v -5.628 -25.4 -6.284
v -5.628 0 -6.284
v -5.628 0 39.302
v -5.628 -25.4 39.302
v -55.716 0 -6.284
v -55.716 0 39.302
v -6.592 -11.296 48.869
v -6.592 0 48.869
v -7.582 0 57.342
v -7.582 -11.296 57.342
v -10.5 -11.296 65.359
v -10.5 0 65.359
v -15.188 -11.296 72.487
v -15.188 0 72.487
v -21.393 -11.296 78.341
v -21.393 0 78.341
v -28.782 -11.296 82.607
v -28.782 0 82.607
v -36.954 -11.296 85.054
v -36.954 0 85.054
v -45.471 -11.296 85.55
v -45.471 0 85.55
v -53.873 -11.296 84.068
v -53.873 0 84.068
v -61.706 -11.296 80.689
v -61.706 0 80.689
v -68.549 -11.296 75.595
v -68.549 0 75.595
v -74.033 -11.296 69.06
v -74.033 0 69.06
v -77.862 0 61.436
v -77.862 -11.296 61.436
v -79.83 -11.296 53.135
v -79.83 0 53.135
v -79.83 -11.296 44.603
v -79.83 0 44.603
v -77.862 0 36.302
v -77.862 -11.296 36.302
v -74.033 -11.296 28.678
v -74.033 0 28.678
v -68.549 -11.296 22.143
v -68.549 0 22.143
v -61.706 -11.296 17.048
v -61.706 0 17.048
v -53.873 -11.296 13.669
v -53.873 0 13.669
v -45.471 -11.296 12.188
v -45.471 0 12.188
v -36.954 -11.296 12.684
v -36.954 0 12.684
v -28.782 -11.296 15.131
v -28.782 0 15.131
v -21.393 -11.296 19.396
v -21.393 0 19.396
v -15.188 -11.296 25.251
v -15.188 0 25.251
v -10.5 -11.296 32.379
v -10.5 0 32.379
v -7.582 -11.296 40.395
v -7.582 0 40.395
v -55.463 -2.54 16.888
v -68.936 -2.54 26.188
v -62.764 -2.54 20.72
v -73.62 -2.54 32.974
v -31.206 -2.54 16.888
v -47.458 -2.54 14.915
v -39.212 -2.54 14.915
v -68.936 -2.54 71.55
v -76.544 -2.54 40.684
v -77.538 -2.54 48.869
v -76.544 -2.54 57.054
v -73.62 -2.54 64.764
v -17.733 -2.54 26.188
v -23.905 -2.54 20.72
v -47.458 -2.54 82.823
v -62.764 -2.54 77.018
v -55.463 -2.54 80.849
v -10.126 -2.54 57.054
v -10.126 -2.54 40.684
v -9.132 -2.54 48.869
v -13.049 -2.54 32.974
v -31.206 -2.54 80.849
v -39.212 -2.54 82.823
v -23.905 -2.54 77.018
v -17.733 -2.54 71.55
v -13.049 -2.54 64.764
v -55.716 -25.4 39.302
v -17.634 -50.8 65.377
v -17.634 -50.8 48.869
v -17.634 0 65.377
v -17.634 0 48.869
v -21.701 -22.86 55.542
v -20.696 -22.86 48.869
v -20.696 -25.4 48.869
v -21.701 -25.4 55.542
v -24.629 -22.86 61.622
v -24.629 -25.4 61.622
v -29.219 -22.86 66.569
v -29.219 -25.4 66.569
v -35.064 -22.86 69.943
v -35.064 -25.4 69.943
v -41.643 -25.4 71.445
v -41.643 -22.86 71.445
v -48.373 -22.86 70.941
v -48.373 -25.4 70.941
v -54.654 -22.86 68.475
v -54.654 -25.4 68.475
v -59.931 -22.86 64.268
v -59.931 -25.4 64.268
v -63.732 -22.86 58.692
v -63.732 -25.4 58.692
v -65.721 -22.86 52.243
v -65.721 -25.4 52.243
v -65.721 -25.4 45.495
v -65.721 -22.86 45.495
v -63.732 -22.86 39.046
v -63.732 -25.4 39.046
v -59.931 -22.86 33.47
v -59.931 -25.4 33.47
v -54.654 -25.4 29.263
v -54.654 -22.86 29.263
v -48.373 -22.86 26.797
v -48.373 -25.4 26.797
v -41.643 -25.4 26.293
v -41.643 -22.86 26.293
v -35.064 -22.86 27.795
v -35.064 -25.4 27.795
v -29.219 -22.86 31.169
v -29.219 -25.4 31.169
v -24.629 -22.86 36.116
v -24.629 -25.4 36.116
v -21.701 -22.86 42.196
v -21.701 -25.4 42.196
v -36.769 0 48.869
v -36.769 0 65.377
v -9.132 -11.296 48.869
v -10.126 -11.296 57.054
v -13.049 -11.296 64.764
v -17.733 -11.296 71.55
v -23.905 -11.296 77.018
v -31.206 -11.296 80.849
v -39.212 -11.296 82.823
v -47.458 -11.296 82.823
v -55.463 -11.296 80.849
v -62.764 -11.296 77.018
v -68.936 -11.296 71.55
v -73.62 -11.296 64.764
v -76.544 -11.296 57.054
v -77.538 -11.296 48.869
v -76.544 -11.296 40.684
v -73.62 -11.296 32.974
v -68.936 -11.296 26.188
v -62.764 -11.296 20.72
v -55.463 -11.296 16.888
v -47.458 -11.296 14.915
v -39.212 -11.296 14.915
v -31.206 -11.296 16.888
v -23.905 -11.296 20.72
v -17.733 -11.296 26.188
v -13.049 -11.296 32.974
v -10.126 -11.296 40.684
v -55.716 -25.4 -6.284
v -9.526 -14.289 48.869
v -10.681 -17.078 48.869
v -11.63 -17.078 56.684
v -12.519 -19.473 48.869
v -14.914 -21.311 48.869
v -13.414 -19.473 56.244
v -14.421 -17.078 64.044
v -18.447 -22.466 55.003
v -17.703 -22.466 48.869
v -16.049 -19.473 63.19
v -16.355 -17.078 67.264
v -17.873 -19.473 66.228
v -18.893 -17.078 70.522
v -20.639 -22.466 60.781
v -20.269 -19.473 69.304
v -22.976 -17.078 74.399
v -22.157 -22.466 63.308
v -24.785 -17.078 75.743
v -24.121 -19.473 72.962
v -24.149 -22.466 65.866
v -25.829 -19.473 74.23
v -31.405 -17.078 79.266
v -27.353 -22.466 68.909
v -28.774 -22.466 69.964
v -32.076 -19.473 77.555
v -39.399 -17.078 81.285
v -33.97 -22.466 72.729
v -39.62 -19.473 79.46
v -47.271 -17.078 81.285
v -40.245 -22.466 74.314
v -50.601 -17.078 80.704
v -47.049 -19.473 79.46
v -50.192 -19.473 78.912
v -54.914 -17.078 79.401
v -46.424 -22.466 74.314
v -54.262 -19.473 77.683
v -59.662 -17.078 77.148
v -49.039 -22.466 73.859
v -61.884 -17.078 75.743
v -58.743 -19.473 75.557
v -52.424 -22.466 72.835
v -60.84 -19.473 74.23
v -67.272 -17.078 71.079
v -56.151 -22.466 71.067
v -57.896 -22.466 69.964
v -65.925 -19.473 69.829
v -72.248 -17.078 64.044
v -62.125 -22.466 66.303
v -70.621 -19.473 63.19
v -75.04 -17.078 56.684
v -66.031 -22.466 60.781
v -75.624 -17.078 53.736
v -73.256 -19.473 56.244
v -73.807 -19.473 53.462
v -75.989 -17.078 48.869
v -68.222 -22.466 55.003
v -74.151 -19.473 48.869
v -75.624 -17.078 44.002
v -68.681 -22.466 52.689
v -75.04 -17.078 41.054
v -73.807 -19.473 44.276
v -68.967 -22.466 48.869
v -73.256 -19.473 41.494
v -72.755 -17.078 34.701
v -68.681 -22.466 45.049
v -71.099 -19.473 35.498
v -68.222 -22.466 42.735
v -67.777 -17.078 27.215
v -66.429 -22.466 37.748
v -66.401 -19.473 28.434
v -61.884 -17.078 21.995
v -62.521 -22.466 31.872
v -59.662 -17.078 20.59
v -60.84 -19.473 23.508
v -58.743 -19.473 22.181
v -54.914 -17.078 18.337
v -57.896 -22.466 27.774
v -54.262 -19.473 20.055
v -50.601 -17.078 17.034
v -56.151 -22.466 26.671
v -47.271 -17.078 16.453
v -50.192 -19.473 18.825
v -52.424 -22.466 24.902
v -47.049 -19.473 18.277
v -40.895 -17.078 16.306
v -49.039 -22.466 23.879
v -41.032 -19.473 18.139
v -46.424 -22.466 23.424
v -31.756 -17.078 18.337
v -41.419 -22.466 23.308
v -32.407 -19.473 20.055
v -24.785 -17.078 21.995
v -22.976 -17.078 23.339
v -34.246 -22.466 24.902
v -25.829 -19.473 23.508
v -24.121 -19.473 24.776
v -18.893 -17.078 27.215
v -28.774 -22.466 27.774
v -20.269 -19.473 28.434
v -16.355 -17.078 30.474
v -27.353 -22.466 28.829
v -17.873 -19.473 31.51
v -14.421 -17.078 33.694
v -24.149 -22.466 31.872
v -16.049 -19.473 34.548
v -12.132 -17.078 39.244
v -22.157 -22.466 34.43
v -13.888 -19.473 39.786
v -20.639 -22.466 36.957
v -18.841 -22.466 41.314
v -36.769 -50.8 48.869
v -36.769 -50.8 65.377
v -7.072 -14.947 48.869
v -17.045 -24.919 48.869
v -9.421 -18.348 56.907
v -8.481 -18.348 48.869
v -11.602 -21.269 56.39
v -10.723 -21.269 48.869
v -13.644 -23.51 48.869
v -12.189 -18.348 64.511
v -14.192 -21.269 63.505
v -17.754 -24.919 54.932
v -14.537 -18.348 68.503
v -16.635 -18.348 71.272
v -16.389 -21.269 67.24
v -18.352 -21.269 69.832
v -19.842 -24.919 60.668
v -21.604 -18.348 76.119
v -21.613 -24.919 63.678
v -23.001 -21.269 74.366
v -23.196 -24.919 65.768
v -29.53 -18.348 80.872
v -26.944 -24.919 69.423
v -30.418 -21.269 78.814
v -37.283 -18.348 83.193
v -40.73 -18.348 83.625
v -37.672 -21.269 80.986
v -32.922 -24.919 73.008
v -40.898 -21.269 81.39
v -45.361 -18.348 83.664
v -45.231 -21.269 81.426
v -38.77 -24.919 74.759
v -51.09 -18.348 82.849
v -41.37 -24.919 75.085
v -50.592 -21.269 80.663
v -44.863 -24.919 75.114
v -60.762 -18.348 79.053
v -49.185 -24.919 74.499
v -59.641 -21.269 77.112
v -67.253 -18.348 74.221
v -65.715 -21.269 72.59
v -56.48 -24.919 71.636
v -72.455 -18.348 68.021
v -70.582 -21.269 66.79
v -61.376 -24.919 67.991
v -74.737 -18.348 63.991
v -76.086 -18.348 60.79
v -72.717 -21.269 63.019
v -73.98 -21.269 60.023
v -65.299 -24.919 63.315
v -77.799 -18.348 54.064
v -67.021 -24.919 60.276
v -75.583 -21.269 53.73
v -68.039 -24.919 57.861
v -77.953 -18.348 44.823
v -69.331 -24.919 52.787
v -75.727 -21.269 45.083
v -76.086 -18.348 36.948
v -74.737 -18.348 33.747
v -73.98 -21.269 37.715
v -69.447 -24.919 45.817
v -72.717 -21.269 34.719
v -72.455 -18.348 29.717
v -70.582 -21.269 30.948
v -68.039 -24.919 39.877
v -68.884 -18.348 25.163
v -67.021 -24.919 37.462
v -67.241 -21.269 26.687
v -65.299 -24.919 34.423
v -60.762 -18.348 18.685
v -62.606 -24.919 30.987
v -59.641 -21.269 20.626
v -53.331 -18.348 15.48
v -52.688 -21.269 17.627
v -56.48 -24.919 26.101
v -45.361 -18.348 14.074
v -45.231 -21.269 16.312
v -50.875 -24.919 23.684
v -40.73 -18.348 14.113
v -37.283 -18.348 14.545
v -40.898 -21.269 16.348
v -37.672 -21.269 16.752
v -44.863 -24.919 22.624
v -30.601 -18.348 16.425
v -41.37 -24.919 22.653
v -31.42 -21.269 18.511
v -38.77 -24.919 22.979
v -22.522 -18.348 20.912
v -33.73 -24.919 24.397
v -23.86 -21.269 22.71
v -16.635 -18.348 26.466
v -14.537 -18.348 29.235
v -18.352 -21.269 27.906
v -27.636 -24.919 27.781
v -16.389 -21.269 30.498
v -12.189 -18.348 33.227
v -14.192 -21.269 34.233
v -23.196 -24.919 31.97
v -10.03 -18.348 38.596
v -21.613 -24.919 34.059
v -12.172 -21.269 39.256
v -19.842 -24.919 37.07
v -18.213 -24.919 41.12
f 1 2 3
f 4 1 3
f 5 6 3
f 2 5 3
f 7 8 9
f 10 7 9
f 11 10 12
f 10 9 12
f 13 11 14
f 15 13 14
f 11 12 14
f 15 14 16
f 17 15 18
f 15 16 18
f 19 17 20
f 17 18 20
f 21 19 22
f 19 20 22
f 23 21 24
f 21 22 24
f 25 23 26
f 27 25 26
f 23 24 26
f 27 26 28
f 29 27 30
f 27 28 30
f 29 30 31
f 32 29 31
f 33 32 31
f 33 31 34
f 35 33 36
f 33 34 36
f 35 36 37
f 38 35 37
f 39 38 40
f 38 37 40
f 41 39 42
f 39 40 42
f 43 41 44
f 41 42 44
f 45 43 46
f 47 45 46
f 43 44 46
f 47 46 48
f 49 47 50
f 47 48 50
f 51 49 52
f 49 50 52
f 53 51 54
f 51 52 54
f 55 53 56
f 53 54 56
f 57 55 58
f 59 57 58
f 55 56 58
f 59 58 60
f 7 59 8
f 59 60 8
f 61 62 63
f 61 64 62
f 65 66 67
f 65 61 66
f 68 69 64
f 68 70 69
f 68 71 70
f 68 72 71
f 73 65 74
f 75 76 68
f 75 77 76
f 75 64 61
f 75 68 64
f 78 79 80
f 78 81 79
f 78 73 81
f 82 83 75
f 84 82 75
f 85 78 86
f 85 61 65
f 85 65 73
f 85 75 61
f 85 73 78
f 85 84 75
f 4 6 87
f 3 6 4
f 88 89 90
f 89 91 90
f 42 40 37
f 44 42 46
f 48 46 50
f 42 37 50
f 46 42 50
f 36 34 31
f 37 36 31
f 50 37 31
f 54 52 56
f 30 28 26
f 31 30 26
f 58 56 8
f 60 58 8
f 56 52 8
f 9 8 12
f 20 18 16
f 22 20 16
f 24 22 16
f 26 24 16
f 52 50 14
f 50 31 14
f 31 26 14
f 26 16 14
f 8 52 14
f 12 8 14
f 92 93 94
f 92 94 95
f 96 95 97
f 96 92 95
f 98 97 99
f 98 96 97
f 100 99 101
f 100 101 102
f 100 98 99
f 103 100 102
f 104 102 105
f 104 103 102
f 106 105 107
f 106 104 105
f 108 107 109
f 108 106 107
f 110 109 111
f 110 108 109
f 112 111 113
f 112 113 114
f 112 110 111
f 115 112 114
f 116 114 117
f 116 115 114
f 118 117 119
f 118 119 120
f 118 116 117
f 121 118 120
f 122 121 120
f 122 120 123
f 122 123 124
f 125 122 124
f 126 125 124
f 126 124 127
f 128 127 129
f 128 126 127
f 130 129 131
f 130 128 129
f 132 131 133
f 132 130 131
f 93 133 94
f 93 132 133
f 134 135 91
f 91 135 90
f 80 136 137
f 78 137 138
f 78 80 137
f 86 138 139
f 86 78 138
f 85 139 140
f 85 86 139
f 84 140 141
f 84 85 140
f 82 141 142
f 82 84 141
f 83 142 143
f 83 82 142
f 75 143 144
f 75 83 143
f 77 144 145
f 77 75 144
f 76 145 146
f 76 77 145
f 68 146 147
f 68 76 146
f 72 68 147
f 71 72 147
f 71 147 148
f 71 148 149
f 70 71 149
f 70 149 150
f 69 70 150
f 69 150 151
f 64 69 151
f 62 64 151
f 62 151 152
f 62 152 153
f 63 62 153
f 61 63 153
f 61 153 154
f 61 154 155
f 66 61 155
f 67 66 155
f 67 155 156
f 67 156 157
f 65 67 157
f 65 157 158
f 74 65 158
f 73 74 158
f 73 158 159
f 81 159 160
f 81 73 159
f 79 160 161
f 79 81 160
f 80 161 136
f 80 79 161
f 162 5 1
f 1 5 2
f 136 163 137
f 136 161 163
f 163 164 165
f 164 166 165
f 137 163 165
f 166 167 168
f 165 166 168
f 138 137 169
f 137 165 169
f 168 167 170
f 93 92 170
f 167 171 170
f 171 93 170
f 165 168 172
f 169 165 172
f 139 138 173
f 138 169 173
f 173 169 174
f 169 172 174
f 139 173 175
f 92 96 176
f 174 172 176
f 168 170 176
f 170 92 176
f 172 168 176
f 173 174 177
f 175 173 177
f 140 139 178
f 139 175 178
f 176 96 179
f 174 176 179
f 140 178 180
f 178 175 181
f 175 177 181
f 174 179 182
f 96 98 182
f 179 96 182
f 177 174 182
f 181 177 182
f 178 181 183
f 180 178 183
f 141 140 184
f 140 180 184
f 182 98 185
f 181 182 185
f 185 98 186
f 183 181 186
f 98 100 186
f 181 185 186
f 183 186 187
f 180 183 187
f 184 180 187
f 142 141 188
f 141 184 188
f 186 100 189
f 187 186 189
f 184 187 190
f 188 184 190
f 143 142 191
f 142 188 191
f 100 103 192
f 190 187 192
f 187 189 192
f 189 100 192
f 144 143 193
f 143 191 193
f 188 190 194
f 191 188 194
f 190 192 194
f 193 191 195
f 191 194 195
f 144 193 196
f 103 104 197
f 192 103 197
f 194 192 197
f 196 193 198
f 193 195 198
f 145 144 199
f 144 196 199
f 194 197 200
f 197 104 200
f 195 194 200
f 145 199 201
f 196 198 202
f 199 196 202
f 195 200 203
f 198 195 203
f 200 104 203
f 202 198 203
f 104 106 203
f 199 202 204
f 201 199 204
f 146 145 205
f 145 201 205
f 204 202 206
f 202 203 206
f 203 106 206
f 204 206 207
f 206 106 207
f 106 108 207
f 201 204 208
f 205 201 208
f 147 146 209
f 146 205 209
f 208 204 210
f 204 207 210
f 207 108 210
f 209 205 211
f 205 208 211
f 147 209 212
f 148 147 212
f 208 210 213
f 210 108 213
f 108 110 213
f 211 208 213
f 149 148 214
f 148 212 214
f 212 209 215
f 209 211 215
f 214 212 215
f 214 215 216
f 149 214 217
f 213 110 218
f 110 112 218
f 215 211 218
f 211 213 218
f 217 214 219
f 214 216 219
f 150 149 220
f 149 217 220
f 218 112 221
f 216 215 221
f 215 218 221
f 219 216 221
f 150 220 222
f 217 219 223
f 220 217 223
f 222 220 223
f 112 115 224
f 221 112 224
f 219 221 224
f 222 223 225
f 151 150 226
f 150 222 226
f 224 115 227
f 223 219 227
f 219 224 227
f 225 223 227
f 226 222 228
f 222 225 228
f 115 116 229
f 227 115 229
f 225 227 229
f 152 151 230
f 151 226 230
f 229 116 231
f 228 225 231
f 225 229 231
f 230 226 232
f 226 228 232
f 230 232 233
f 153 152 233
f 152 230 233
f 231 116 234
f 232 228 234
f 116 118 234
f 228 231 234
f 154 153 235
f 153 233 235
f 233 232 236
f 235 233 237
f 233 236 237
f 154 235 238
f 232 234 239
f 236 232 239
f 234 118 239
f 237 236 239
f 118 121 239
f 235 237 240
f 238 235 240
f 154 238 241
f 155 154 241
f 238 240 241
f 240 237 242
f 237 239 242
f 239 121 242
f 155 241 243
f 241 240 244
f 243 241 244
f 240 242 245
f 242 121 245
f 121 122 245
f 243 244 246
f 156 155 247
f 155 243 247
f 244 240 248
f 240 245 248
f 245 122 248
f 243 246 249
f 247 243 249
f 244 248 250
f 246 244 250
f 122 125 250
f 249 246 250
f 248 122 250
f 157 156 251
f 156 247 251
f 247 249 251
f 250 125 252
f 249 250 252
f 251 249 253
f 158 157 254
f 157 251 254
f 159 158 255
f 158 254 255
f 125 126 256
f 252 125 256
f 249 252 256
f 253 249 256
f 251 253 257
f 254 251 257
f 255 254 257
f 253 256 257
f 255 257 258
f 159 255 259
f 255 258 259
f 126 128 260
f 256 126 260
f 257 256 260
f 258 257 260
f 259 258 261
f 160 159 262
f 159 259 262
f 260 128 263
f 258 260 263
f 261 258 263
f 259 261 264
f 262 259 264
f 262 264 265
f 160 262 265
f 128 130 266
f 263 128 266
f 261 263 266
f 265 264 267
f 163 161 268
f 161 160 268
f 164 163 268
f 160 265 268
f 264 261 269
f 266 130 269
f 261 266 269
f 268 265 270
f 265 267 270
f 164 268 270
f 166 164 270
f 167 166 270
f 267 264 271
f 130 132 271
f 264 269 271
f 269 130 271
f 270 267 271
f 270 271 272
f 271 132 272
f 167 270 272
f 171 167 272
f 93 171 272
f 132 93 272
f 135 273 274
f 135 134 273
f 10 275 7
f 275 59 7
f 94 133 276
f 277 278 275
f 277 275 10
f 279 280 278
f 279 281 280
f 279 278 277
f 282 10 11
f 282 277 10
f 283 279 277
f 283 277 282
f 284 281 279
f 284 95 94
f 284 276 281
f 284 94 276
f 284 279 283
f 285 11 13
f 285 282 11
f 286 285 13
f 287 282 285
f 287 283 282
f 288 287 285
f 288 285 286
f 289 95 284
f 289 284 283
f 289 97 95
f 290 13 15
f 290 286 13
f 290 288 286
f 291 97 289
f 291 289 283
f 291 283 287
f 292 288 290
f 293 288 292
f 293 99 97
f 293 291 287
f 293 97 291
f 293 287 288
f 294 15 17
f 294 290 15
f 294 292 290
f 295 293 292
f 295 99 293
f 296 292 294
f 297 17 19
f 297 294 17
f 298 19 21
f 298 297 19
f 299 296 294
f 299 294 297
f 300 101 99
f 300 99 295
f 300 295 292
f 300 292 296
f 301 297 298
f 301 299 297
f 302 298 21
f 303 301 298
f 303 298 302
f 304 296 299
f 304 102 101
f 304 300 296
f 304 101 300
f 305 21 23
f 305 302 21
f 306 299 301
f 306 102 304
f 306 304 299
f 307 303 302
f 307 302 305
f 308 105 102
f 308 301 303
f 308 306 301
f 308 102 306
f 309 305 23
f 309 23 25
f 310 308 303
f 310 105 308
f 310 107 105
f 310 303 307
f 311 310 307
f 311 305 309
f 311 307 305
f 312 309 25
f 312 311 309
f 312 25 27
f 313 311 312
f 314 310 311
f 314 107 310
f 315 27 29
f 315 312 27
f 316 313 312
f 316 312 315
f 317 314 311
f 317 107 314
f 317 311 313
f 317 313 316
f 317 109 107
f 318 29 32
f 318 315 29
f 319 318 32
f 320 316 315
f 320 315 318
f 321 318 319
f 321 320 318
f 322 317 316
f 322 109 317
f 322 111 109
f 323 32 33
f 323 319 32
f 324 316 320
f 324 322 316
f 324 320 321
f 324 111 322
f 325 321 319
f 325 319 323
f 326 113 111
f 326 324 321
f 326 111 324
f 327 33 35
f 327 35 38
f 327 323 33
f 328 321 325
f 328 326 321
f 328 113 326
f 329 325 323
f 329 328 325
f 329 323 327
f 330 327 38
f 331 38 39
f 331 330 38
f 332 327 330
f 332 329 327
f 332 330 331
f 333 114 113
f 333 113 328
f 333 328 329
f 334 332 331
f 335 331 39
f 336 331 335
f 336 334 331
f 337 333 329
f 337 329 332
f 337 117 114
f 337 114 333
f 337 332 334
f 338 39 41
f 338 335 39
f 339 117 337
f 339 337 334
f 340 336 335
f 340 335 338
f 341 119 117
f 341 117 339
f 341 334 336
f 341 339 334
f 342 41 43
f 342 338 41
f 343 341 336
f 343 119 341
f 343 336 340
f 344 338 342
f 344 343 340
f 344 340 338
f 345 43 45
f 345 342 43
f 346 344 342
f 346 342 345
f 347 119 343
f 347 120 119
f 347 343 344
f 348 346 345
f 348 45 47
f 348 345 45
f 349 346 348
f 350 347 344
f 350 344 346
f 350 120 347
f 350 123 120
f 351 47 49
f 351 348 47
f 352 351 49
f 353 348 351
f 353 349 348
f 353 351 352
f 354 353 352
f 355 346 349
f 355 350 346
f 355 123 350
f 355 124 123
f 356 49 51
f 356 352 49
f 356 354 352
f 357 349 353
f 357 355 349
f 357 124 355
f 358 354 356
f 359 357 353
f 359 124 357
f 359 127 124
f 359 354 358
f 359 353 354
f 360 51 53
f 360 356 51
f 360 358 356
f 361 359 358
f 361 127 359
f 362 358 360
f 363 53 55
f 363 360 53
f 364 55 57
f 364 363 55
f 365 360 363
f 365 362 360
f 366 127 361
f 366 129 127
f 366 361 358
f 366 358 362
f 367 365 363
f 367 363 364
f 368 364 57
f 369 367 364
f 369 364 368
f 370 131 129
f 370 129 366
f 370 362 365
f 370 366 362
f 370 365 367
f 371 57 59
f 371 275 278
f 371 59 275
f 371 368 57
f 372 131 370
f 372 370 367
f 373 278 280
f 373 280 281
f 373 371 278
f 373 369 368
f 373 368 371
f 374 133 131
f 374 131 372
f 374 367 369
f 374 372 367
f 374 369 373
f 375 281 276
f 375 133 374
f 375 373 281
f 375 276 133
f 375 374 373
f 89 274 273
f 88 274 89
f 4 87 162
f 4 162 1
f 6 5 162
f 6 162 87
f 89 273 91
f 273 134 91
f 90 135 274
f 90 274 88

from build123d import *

# Parameters (mm, degrees)
F1_W     = 19.1348660737
F1_H     = 16.5085121989
F2_DEPTH = 25.4
F1_W_2   = 50.0883217901
F1_H_2   = 45.5860048532
F0_R     = 36.7431063658
F3_R     = 14.1038356314
F4_T     = -2.54
F5_DEPTH = 25.4


# Not quite as in the source:
# - a shell that OpenCascade refuses in one call is made with other operations: the cavity is built on its own and cut out


with BuildPart() as f2:
    # F1 (on Front) → F2 (new body)
    with BuildSketch(Plane.XZ):
        with Locations((-27.2015249357, 57.1232028306)):
            Rectangle(F1_W, F1_H)
    extrude(amount=F2_DEPTH)

    # F5 (add): a face of the model
    f5_faces = [f2.faces().sort_by_distance(p)[0] for p in [
        (-27.2015249357, -25.4, 57.1232028306),
    ]]
    extrude(f5_faces, amount=F5_DEPTH)


with BuildPart() as f2b:
    # F1 (on Front) → F2, piece 2 (new body)
    with BuildSketch(Plane.XZ):
        with Locations((-30.6720631197, 16.5085121989)):
            Rectangle(F1_W_2, F1_H_2)
    extrude(amount=F2_DEPTH)


with BuildPart() as f2c:
    # F0 (on Front) → F2, piece 3 (new body)
    with BuildSketch(Plane.XZ):
        with Locations((-43.3348417282, 48.8689467311)):
            Circle(F0_R)
    extrude(amount=F2_DEPTH)

    # F3
    f3_edges = [f2c.edges().sort_by_distance(p)[0] for p in [
        (-80.077948, -25.4, 48.868947),
    ]]
    fillet(f3_edges, radius=F3_R)

    # F4: a shell. OpenCascade refuses it in one call, so the cavity is built on its own and cut out:
    # the body offset inwards by the wall thickness, plus a prism from it out through each open face.
    f4_core = offset(f2c.part, amount=F4_T, mode=Mode.PRIVATE)
    f4_exits = [f4_core.faces().sort_by_distance(p)[0] for p in [
        (-43.334842, -22.86, 48.868947),
    ]]
    add(f4_core, mode=Mode.SUBTRACT)
    extrude(f4_exits, amount=-F4_T, mode=Mode.SUBTRACT)


solid = Compound([f2.part, f2b.part, f2c.part])
